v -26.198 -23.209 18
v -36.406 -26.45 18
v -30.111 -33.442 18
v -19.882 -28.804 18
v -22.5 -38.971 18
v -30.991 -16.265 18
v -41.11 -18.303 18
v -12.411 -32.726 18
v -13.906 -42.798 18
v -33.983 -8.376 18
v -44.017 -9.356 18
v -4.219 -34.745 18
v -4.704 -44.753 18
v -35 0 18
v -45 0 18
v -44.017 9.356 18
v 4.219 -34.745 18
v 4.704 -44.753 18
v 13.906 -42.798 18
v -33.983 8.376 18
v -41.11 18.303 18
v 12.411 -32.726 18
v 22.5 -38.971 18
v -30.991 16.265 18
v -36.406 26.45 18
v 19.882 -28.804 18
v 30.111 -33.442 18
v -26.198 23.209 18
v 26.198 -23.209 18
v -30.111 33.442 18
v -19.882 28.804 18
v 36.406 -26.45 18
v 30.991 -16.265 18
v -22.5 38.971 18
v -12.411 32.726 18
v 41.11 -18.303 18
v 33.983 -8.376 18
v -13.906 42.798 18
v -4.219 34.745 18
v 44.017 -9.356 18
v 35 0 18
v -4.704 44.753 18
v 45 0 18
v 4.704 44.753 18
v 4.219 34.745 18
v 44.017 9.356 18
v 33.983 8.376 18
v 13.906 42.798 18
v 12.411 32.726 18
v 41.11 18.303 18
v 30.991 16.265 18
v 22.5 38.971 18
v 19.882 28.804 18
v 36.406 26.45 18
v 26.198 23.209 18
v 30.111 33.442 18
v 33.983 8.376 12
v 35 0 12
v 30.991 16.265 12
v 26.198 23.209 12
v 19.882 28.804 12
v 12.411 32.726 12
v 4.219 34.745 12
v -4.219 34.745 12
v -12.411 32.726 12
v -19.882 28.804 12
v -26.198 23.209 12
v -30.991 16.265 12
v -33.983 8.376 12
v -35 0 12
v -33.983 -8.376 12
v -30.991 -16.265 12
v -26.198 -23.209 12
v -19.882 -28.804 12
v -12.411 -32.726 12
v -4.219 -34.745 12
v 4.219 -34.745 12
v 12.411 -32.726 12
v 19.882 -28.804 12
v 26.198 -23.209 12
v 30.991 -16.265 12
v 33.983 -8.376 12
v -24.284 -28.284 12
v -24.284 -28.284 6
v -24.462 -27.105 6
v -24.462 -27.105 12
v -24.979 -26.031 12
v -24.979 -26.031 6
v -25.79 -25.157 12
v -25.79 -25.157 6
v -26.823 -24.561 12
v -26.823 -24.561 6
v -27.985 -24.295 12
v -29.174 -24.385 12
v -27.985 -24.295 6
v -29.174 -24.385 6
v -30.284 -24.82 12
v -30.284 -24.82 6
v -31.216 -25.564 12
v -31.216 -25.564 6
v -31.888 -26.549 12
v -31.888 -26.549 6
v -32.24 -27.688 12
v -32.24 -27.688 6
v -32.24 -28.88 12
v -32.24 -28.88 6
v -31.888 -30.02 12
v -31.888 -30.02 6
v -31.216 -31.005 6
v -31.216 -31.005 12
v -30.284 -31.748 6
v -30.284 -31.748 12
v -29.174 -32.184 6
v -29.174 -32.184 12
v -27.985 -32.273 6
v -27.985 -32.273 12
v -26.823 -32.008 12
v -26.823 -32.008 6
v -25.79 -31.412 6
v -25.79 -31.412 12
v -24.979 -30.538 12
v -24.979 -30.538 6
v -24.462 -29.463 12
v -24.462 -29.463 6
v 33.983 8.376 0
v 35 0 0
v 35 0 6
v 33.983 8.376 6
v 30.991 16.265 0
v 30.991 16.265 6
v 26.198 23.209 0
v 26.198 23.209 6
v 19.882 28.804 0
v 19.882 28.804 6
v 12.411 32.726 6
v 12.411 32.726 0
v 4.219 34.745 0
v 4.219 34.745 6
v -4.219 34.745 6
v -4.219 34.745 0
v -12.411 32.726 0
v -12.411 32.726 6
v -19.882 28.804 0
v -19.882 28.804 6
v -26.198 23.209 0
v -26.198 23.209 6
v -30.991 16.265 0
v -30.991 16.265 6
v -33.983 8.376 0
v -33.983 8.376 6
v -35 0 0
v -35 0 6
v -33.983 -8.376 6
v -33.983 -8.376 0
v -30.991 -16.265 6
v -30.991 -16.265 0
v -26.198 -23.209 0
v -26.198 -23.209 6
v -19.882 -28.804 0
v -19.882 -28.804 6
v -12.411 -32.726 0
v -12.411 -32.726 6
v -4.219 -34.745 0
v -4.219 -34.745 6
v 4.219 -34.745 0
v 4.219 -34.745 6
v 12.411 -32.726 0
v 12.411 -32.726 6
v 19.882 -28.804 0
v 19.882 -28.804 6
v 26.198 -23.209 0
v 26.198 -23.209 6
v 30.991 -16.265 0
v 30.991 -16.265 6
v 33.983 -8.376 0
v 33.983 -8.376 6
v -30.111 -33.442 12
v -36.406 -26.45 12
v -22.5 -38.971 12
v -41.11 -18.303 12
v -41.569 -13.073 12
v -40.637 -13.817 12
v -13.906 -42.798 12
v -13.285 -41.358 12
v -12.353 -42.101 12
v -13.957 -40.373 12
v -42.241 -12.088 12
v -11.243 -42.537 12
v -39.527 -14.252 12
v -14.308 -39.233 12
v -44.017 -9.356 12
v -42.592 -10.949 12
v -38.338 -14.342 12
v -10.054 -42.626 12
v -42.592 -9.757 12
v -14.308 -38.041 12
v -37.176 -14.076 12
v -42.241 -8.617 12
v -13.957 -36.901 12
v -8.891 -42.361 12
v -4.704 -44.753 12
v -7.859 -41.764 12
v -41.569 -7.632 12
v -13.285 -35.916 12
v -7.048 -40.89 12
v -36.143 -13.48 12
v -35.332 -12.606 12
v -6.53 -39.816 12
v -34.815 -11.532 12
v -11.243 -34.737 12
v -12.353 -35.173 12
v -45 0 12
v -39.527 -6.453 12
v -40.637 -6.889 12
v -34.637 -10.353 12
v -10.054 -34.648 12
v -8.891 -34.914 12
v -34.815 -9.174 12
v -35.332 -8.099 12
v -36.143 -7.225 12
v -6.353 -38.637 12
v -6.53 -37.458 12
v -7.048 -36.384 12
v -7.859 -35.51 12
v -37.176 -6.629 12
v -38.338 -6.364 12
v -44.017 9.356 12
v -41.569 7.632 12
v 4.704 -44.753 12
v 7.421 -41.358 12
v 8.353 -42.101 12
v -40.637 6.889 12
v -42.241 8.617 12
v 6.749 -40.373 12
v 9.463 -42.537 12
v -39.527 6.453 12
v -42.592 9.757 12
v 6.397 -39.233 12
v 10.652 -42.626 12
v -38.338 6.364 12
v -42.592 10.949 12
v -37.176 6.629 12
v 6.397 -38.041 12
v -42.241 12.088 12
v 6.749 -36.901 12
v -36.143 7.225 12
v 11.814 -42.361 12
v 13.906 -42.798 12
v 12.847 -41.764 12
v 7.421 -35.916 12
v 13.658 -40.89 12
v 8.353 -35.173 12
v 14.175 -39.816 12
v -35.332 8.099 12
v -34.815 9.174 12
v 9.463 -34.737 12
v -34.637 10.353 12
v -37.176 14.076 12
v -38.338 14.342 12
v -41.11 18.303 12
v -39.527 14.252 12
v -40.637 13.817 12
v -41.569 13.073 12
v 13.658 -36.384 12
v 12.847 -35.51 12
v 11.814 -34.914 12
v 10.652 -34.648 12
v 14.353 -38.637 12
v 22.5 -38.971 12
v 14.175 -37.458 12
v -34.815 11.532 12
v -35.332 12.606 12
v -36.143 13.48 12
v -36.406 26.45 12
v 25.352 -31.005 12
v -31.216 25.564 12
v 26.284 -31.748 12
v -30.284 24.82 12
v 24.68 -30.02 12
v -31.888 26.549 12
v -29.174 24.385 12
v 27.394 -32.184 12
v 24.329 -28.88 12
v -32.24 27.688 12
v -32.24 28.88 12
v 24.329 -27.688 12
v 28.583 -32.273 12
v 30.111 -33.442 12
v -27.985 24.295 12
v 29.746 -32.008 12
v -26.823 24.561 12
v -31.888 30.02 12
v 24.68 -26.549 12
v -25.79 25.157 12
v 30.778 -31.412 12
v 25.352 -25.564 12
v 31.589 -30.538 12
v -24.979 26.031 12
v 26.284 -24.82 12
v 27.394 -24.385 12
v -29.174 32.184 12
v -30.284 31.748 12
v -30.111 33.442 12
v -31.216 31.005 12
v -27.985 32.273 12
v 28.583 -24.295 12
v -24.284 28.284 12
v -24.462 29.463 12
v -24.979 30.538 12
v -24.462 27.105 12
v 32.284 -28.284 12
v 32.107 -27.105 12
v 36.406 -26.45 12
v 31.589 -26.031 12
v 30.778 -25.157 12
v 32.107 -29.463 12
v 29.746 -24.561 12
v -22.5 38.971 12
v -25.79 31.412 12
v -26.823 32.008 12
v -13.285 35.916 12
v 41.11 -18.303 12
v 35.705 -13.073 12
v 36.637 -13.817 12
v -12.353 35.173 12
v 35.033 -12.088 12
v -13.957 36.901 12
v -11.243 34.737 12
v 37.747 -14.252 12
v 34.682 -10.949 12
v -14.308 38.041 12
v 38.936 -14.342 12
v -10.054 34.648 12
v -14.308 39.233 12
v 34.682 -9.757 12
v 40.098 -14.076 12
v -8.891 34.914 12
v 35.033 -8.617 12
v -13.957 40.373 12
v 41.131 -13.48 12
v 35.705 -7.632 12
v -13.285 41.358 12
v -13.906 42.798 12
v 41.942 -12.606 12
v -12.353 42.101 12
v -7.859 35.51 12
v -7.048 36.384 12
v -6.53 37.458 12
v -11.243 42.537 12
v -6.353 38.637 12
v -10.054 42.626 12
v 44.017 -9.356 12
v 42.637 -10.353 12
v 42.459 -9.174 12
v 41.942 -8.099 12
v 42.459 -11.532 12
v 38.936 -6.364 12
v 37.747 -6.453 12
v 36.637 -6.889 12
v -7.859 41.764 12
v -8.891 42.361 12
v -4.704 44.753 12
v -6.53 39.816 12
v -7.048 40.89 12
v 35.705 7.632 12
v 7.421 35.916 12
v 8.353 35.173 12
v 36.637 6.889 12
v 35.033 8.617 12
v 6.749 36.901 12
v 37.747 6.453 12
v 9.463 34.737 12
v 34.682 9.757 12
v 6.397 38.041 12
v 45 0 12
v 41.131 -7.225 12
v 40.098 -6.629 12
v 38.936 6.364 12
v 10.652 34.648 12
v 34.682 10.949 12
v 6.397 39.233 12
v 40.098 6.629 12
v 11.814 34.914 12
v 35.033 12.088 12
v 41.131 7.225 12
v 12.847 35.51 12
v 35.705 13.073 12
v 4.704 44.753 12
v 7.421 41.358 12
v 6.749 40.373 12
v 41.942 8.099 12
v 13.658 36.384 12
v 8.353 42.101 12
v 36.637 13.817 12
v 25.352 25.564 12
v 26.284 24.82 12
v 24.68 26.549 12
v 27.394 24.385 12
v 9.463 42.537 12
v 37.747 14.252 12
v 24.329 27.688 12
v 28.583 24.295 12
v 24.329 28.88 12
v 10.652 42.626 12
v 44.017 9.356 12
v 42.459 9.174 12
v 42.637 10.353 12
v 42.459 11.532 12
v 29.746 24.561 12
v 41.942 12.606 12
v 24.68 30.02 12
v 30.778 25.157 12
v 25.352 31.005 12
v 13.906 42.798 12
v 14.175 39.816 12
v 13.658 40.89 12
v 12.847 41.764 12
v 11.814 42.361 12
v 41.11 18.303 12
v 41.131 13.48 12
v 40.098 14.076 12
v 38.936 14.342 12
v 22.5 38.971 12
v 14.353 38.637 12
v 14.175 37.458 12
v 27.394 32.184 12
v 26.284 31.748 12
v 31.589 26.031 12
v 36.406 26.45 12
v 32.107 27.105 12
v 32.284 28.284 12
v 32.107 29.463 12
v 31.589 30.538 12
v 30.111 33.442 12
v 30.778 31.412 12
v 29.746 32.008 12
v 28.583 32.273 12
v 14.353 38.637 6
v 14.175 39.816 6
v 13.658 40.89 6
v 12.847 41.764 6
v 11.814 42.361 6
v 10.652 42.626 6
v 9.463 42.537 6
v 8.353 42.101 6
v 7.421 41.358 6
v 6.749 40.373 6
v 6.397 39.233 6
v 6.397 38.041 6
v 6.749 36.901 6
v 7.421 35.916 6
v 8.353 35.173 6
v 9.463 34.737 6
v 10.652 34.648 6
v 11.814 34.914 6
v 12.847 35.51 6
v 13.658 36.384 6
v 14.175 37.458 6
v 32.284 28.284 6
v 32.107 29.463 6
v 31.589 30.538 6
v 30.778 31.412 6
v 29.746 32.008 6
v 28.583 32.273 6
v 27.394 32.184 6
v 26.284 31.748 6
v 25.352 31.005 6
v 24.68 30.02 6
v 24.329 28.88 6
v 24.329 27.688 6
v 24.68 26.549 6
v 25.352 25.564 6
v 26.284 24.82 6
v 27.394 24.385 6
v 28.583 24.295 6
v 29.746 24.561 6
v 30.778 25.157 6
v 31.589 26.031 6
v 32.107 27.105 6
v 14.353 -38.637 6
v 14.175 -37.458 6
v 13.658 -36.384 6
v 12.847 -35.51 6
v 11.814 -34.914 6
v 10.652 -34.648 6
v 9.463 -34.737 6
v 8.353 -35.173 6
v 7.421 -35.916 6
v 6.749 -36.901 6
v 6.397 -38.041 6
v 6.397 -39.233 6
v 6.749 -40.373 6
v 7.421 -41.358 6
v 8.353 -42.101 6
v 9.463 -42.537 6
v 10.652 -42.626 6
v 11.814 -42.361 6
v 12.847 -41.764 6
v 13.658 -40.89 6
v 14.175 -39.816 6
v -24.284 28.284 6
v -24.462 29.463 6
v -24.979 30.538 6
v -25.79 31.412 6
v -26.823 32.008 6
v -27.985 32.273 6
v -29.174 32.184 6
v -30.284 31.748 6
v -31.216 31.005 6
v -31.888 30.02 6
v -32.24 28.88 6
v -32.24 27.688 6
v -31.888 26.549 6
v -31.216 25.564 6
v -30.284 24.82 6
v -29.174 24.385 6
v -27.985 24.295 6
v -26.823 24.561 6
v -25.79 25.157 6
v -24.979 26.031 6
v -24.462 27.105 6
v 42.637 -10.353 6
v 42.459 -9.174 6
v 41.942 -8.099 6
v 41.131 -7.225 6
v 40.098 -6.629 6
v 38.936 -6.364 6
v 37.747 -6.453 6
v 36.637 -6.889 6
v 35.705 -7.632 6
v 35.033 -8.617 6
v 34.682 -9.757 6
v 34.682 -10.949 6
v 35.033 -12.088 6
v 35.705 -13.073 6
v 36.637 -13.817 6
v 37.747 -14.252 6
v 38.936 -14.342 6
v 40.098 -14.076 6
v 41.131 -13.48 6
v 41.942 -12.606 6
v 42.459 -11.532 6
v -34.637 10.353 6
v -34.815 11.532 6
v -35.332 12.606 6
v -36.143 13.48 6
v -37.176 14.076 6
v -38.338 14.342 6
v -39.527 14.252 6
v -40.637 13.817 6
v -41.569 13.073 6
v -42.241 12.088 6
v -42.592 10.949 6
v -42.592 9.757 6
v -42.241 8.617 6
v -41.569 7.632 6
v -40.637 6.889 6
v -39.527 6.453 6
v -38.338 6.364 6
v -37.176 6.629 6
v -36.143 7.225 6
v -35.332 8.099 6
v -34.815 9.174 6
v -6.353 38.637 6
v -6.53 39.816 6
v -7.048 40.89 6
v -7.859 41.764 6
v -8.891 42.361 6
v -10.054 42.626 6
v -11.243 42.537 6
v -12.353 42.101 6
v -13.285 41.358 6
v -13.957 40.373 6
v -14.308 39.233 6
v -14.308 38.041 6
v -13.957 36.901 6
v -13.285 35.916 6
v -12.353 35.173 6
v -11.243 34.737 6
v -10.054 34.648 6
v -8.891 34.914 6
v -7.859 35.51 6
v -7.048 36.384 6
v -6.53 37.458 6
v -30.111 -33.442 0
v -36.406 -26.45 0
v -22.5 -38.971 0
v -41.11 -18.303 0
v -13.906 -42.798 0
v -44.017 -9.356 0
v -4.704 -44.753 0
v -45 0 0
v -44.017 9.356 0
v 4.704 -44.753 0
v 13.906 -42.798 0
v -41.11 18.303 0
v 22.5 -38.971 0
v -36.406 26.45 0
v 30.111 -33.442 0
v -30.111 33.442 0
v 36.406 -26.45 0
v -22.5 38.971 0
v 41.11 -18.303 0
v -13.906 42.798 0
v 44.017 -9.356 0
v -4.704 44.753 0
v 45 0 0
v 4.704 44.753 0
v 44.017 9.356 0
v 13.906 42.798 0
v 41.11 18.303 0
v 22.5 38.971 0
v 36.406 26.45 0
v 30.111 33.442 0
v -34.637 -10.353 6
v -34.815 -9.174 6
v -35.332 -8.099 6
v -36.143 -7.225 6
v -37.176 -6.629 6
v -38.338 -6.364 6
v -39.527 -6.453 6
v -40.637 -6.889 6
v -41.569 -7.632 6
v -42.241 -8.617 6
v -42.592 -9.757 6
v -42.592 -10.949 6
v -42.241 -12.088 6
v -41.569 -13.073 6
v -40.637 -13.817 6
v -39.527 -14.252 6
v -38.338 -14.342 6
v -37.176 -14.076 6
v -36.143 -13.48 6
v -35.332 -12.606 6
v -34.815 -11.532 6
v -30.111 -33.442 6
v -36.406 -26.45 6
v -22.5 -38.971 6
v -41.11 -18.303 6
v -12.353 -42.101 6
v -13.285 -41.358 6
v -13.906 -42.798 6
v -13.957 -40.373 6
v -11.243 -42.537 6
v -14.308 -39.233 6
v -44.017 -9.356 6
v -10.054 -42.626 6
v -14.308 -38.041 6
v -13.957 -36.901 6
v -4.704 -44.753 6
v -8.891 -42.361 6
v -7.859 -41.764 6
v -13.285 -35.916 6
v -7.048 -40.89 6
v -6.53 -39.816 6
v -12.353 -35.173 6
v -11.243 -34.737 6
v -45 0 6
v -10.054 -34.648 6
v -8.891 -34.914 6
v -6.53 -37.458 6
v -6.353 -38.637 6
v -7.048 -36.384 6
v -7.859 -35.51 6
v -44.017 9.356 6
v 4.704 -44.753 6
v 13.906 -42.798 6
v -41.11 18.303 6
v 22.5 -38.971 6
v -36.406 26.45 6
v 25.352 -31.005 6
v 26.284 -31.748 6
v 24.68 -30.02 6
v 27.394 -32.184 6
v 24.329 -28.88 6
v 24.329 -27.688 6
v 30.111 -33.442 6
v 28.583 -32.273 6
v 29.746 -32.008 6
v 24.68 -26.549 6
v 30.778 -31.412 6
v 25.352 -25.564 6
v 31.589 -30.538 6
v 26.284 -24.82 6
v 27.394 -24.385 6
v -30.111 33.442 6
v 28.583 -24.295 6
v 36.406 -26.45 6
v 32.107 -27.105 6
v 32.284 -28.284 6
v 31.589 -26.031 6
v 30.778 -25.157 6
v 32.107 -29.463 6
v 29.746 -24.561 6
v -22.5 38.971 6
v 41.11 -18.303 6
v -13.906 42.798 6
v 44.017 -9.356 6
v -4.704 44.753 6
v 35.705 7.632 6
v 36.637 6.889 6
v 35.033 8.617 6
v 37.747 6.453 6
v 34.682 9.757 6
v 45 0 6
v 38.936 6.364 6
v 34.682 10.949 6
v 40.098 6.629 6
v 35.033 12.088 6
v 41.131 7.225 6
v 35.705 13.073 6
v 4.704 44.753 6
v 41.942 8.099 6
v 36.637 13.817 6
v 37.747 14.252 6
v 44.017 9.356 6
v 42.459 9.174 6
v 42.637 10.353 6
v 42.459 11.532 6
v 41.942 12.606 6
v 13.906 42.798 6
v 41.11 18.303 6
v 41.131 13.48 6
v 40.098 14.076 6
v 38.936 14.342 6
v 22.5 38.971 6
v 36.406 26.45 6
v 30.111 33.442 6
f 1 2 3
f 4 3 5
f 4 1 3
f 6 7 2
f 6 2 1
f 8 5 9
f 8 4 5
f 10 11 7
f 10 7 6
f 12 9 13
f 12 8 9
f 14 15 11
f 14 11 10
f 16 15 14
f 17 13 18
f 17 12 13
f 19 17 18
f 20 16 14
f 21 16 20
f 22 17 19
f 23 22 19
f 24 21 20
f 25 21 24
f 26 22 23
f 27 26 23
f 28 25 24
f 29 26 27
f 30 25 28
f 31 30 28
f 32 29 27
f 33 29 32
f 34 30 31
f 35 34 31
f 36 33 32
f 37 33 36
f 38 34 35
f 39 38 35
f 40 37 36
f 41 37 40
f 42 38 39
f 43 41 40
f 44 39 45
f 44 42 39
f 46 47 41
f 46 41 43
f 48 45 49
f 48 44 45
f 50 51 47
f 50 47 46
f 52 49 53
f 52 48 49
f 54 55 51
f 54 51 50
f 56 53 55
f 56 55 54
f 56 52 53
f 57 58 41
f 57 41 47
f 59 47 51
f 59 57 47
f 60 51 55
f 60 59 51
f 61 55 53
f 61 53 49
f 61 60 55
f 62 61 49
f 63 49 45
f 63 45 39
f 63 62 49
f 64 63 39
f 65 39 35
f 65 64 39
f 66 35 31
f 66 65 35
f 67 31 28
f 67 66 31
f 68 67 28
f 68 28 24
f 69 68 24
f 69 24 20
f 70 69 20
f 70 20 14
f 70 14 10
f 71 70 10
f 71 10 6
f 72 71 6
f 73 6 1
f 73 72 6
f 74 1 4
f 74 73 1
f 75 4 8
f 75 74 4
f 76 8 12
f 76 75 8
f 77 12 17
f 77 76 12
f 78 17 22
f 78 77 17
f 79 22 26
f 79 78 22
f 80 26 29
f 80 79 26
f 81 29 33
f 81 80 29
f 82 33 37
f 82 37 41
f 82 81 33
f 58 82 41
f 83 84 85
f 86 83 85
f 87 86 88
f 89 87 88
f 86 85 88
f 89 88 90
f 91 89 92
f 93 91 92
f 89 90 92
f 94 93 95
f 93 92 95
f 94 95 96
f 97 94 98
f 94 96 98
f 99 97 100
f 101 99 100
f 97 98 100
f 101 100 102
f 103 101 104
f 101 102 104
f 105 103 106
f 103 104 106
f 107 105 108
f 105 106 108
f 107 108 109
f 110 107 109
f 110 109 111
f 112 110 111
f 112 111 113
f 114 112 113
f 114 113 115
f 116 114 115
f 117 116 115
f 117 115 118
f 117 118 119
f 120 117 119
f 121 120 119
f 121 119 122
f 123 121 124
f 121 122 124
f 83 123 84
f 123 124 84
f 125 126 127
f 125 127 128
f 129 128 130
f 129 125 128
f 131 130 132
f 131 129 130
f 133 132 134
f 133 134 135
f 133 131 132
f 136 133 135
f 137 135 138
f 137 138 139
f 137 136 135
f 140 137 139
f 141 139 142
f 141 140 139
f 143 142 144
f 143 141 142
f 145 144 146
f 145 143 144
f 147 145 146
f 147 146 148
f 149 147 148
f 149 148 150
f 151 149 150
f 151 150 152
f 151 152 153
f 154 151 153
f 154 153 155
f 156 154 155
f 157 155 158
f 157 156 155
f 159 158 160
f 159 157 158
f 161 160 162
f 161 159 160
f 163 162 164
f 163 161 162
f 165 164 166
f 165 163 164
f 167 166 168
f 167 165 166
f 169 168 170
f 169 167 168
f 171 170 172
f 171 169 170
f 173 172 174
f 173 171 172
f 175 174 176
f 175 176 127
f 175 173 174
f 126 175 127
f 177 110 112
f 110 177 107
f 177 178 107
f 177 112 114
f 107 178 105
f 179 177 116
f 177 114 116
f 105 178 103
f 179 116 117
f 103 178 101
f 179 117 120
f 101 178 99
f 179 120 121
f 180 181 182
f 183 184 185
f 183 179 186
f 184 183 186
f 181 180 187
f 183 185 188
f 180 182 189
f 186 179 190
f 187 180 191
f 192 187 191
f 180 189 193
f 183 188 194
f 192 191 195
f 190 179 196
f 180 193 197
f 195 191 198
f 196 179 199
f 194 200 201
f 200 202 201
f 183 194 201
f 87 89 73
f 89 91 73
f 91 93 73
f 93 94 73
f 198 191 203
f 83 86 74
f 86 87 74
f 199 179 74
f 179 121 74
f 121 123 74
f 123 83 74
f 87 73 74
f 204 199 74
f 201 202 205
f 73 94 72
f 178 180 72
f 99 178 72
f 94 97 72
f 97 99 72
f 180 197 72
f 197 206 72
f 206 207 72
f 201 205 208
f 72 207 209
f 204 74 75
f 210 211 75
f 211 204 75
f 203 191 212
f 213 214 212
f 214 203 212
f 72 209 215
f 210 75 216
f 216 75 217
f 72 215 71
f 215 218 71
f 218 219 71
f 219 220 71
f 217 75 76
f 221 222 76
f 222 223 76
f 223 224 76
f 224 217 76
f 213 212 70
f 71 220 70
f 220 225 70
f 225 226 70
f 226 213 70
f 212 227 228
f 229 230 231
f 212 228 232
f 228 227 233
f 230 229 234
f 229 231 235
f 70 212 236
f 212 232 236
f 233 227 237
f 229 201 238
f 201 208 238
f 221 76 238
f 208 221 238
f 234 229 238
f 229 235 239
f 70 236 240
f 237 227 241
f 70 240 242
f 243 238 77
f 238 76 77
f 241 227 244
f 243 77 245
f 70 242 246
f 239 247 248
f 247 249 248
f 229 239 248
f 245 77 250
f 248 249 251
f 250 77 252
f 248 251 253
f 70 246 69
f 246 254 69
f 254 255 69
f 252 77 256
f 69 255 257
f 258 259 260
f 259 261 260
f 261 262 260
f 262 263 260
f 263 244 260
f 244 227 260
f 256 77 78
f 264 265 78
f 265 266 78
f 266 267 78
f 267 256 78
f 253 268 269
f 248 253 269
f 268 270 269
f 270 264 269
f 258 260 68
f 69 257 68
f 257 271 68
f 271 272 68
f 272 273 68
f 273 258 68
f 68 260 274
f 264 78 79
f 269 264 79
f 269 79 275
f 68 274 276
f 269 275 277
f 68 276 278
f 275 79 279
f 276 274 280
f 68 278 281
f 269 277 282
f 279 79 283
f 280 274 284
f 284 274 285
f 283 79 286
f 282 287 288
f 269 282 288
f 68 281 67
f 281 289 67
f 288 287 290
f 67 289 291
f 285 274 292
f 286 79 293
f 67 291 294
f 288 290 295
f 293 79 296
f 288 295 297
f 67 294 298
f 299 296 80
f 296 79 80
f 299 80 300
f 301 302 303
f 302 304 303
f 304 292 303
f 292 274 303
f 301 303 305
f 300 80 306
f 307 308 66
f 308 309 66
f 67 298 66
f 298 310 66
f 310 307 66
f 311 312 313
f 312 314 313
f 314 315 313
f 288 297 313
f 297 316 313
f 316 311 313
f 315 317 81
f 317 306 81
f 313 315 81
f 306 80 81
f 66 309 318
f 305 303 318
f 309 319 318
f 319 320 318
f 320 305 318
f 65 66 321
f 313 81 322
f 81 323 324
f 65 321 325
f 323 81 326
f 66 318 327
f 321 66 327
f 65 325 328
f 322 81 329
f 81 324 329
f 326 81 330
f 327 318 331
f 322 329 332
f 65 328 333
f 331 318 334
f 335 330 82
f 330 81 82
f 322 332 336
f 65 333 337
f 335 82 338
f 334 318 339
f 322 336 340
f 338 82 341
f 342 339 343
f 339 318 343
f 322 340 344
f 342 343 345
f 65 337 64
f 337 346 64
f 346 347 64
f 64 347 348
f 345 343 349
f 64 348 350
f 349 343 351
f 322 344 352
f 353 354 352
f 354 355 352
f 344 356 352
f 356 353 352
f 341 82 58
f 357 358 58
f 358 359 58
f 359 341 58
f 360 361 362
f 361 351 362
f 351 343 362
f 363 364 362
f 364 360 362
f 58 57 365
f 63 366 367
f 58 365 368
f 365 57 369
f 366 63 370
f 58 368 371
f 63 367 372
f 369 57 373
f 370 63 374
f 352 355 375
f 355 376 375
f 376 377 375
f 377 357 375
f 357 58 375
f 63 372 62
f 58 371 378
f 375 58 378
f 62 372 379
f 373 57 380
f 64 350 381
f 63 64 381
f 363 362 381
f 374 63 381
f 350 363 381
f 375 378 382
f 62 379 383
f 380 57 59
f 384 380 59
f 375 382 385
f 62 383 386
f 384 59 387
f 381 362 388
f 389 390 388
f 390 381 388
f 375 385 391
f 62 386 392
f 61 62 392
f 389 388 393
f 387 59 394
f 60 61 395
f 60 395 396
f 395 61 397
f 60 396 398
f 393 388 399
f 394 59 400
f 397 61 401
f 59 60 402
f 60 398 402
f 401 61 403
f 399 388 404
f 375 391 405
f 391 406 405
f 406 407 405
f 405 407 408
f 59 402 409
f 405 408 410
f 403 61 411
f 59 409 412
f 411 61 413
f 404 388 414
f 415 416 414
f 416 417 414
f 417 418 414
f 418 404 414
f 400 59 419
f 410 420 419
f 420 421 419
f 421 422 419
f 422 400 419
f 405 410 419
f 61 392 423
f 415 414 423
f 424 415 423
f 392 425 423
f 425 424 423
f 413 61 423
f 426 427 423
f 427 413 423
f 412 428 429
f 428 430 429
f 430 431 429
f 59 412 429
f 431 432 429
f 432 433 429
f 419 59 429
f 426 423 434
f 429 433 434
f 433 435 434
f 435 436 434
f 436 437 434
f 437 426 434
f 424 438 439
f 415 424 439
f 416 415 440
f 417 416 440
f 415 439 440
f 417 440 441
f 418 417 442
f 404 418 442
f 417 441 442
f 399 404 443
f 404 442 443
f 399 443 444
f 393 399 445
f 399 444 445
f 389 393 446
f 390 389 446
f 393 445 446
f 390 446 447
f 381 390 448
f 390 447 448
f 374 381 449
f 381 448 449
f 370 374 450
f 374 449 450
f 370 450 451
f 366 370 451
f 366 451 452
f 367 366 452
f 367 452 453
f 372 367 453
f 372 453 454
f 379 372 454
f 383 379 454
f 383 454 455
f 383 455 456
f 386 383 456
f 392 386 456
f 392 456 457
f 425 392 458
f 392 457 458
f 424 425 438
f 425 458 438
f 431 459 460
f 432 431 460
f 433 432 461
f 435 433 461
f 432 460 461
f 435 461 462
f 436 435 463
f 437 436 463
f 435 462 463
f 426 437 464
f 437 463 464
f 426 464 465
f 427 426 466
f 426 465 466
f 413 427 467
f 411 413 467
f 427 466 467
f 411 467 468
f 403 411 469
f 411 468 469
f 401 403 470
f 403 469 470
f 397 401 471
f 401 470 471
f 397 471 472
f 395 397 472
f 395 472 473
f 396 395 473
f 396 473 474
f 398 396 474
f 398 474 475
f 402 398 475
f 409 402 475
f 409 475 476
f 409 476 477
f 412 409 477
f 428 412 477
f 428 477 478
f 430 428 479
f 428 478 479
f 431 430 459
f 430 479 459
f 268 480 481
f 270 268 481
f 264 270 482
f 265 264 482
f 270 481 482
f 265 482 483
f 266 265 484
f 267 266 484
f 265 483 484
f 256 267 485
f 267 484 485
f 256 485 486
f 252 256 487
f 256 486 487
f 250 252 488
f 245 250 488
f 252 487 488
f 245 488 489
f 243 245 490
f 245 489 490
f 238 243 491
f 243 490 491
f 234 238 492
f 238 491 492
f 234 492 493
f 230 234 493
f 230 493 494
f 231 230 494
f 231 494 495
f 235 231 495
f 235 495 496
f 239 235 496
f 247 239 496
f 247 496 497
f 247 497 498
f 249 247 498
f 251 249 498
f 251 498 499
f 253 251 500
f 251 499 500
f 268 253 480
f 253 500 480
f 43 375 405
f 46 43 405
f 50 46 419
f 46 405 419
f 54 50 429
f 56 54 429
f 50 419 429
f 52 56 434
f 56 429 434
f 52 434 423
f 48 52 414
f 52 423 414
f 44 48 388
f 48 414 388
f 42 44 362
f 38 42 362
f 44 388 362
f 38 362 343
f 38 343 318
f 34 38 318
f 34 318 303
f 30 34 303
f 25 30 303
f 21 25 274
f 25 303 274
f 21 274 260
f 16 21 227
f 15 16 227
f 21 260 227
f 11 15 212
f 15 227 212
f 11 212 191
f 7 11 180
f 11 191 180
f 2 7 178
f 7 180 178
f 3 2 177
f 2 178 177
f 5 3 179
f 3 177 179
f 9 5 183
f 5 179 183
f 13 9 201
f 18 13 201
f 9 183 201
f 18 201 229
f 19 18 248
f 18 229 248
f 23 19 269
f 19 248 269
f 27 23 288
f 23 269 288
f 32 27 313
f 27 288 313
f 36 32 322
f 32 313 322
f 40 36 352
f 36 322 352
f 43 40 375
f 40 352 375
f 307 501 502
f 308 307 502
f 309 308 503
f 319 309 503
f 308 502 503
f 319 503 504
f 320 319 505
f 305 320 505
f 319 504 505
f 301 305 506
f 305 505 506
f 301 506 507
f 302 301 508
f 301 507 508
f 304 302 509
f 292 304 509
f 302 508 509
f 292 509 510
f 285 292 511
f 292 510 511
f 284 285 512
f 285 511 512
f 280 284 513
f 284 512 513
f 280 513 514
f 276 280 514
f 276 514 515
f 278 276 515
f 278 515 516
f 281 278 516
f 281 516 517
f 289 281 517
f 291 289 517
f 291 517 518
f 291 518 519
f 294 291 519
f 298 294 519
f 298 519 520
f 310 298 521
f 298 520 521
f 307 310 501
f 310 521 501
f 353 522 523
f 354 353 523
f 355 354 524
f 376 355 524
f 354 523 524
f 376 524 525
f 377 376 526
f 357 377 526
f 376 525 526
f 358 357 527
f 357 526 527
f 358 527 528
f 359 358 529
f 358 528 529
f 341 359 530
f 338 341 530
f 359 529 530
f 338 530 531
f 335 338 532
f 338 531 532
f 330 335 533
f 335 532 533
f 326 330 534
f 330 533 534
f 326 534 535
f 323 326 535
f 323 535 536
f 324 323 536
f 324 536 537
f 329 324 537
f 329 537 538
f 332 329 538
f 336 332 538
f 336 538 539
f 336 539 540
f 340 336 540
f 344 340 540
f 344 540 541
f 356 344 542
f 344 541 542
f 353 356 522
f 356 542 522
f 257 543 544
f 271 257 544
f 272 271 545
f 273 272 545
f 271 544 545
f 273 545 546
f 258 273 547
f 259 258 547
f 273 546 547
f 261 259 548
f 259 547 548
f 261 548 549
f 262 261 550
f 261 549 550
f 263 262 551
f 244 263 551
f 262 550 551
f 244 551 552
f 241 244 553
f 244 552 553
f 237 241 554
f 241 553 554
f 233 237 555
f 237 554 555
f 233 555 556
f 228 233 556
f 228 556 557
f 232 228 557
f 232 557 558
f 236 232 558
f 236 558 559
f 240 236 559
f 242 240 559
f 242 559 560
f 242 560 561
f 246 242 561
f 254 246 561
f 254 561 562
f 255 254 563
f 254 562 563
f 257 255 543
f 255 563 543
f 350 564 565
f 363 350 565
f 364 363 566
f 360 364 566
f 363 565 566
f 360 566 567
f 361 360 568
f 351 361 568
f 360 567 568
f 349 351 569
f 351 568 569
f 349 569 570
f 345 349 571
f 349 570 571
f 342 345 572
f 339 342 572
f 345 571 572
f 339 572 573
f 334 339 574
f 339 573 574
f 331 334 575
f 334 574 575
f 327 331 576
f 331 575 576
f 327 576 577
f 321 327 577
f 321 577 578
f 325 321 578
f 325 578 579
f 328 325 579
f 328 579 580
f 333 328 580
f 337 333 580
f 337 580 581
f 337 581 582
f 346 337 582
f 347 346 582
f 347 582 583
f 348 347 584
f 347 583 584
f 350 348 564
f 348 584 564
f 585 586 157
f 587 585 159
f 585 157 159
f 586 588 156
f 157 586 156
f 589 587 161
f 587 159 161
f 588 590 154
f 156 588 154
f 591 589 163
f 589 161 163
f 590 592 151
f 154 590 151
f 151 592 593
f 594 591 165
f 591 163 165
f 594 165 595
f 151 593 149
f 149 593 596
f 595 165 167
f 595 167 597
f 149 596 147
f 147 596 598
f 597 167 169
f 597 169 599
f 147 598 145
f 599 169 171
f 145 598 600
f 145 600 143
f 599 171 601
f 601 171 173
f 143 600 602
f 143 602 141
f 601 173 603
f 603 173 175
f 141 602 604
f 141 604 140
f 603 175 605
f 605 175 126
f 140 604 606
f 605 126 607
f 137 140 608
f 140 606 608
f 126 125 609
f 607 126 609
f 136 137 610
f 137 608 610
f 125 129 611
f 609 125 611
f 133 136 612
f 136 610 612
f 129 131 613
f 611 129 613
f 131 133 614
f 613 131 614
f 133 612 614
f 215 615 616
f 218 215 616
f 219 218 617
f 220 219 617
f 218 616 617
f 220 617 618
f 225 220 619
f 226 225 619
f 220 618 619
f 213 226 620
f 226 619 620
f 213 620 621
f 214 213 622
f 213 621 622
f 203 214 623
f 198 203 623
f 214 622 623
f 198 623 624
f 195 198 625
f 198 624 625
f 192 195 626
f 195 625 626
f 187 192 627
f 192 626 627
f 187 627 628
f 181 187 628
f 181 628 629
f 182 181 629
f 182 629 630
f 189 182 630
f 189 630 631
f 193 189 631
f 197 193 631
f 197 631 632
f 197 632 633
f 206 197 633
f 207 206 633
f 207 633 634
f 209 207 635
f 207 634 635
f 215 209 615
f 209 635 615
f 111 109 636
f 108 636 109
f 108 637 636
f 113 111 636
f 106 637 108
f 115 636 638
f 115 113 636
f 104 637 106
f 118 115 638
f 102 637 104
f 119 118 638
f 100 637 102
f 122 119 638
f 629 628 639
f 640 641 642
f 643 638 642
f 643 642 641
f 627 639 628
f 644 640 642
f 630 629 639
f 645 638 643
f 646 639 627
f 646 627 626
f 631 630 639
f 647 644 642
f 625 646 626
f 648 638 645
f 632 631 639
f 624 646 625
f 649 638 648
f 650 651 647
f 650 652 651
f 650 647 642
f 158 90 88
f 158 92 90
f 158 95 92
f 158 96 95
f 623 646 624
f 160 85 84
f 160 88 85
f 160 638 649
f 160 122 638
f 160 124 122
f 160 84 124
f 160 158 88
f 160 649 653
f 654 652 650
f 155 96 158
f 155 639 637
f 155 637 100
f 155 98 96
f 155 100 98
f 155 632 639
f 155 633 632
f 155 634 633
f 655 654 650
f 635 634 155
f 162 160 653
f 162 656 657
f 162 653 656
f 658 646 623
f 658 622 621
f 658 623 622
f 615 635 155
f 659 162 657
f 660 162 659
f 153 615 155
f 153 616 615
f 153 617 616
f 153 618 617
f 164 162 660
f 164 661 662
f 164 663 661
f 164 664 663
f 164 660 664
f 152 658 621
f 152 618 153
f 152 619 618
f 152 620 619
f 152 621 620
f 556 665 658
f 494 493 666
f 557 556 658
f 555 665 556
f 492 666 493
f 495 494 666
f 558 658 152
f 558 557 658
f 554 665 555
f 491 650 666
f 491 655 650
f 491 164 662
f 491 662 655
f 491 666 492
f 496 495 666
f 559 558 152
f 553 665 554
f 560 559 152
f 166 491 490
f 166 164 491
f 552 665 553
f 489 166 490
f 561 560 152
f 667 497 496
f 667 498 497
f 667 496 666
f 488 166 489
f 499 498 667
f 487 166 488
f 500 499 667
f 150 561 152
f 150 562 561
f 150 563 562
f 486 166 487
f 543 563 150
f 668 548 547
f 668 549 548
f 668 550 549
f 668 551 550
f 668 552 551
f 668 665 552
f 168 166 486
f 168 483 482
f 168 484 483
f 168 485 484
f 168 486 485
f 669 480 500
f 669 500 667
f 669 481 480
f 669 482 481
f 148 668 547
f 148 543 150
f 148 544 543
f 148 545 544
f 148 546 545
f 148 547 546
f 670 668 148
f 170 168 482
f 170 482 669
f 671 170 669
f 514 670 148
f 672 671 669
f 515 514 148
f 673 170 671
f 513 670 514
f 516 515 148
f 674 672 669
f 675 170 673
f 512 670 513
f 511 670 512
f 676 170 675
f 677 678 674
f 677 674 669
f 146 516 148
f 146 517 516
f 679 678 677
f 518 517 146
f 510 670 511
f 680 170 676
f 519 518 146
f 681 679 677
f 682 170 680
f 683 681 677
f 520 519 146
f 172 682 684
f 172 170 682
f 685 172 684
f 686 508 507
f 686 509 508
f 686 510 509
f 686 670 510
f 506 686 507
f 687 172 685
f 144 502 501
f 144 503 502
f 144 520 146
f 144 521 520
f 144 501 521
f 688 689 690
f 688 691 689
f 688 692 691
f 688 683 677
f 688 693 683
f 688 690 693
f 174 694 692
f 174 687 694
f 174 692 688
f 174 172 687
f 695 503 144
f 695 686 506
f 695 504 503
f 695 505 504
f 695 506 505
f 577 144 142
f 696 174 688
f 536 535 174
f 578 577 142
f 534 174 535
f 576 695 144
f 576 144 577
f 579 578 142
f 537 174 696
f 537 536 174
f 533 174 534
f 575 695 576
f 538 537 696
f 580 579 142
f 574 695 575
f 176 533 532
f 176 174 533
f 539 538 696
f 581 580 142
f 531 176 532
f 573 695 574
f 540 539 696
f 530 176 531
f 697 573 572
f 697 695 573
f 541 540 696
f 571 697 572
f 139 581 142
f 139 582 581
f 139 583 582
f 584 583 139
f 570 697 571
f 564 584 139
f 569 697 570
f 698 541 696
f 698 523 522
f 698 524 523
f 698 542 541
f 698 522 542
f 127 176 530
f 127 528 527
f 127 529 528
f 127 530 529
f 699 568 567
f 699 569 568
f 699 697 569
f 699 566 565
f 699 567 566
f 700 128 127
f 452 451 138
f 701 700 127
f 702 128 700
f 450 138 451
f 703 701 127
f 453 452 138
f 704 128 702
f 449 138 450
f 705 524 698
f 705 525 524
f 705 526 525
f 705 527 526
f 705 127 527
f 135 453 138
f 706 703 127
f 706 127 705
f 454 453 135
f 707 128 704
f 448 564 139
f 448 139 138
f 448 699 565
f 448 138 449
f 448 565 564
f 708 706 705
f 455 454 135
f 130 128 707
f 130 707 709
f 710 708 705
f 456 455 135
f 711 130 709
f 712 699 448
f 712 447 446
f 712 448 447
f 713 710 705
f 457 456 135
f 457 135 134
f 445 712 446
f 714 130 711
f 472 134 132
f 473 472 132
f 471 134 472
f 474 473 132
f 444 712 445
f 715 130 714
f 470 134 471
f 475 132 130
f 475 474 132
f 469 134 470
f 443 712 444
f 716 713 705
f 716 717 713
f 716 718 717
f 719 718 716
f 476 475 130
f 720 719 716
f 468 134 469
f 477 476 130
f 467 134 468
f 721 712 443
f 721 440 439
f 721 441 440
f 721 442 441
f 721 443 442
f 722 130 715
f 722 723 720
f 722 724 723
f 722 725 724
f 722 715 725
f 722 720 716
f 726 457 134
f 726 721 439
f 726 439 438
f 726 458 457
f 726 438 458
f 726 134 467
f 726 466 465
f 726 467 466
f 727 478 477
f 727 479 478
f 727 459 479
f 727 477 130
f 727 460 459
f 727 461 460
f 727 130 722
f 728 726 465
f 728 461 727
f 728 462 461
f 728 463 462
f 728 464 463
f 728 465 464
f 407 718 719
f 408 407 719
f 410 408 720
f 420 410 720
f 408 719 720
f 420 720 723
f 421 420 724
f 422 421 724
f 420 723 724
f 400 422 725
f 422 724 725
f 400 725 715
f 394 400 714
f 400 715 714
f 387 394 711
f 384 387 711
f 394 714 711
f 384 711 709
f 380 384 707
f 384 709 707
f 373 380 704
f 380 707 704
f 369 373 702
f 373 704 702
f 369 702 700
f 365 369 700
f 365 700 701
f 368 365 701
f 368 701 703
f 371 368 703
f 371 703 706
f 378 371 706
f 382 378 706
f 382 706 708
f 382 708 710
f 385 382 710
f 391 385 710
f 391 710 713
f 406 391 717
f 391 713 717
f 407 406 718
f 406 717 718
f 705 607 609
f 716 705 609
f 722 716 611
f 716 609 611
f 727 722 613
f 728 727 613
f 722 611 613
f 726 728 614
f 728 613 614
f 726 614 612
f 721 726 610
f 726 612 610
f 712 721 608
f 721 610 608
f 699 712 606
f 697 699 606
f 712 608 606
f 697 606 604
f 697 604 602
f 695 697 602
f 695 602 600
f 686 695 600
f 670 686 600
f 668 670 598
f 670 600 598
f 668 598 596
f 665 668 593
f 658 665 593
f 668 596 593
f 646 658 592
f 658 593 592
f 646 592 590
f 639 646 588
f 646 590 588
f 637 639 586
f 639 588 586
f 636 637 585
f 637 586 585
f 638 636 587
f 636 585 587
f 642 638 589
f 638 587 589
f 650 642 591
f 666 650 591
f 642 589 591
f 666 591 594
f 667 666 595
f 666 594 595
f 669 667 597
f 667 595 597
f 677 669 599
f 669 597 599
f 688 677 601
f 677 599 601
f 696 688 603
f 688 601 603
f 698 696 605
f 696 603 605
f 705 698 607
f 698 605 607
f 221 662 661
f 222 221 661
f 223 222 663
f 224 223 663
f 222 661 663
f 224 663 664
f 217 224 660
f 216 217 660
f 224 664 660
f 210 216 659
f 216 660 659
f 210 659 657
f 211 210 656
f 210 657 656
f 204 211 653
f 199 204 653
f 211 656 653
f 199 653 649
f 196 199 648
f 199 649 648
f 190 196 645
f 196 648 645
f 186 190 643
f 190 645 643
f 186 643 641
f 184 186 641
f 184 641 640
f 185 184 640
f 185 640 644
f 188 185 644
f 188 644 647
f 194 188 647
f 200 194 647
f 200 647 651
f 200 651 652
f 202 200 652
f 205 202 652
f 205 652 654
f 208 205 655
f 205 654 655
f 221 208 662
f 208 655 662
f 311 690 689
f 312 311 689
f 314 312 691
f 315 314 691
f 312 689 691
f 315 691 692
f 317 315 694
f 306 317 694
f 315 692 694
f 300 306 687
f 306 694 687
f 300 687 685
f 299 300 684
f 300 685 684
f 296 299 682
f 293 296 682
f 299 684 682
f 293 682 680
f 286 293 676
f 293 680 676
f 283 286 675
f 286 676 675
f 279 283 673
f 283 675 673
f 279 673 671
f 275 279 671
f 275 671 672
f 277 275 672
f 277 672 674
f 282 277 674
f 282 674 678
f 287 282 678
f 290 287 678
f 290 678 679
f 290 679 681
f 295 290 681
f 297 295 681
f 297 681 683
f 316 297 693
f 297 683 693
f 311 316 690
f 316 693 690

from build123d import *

# Parameters (mm, degrees)
SKETCH_R      = 45
SKETCH_R_2    = 35
PAD_DEPTH     = 6
SKETCH002_R   = 4
PAD001_DEPTH  = 6
SKETCH003_R   = 45
SKETCH003_R_2 = 35
PAD002_DEPTH  = 6


with BuildPart() as part:
    # Sketch → Pad (new body)
    with BuildSketch(Plane.XY):
        Circle(SKETCH_R)
        Circle(SKETCH_R_2, mode=Mode.SUBTRACT)
    extrude(amount=PAD_DEPTH)

    # Sketch002 (on Face4 of Pad) → Pad001 (join)
    with BuildSketch(Plane.XY.offset(6)):
        with Locations((10.352762, 38.637033)):
            Circle(SKETCH002_R)
        with Locations((28.284271, 28.284271)):
            Circle(SKETCH002_R)
        with Locations((38.637033, 10.352762)):
            Circle(SKETCH002_R)
        with Locations((38.637033, -10.352762)):
            Circle(SKETCH002_R)
        with Locations((28.284271, -28.284271)):
            Circle(SKETCH002_R)
        with Locations((10.352762, -38.637033)):
            Circle(SKETCH002_R)
        with Locations((-10.352762, -38.637033)):
            Circle(SKETCH002_R)
        with Locations((-28.284271, -28.284271)):
            Circle(SKETCH002_R)
        with Locations((-38.637033, -10.352762)):
            Circle(SKETCH002_R)
        with Locations((-38.637033, 10.352762)):
            Circle(SKETCH002_R)
        with Locations((-28.284271, 28.284271)):
            Circle(SKETCH002_R)
        with Locations((-10.352762, 38.637033)):
            Circle(SKETCH002_R)
    extrude(amount=PAD001_DEPTH)

    # Sketch003 (on Face19 of Pad001) → Pad002 (join)
    with BuildSketch(Plane.XY.offset(12)):
        Circle(SKETCH003_R)
        Circle(SKETCH003_R_2, mode=Mode.SUBTRACT)
    extrude(amount=PAD002_DEPTH)


solid = part.part
